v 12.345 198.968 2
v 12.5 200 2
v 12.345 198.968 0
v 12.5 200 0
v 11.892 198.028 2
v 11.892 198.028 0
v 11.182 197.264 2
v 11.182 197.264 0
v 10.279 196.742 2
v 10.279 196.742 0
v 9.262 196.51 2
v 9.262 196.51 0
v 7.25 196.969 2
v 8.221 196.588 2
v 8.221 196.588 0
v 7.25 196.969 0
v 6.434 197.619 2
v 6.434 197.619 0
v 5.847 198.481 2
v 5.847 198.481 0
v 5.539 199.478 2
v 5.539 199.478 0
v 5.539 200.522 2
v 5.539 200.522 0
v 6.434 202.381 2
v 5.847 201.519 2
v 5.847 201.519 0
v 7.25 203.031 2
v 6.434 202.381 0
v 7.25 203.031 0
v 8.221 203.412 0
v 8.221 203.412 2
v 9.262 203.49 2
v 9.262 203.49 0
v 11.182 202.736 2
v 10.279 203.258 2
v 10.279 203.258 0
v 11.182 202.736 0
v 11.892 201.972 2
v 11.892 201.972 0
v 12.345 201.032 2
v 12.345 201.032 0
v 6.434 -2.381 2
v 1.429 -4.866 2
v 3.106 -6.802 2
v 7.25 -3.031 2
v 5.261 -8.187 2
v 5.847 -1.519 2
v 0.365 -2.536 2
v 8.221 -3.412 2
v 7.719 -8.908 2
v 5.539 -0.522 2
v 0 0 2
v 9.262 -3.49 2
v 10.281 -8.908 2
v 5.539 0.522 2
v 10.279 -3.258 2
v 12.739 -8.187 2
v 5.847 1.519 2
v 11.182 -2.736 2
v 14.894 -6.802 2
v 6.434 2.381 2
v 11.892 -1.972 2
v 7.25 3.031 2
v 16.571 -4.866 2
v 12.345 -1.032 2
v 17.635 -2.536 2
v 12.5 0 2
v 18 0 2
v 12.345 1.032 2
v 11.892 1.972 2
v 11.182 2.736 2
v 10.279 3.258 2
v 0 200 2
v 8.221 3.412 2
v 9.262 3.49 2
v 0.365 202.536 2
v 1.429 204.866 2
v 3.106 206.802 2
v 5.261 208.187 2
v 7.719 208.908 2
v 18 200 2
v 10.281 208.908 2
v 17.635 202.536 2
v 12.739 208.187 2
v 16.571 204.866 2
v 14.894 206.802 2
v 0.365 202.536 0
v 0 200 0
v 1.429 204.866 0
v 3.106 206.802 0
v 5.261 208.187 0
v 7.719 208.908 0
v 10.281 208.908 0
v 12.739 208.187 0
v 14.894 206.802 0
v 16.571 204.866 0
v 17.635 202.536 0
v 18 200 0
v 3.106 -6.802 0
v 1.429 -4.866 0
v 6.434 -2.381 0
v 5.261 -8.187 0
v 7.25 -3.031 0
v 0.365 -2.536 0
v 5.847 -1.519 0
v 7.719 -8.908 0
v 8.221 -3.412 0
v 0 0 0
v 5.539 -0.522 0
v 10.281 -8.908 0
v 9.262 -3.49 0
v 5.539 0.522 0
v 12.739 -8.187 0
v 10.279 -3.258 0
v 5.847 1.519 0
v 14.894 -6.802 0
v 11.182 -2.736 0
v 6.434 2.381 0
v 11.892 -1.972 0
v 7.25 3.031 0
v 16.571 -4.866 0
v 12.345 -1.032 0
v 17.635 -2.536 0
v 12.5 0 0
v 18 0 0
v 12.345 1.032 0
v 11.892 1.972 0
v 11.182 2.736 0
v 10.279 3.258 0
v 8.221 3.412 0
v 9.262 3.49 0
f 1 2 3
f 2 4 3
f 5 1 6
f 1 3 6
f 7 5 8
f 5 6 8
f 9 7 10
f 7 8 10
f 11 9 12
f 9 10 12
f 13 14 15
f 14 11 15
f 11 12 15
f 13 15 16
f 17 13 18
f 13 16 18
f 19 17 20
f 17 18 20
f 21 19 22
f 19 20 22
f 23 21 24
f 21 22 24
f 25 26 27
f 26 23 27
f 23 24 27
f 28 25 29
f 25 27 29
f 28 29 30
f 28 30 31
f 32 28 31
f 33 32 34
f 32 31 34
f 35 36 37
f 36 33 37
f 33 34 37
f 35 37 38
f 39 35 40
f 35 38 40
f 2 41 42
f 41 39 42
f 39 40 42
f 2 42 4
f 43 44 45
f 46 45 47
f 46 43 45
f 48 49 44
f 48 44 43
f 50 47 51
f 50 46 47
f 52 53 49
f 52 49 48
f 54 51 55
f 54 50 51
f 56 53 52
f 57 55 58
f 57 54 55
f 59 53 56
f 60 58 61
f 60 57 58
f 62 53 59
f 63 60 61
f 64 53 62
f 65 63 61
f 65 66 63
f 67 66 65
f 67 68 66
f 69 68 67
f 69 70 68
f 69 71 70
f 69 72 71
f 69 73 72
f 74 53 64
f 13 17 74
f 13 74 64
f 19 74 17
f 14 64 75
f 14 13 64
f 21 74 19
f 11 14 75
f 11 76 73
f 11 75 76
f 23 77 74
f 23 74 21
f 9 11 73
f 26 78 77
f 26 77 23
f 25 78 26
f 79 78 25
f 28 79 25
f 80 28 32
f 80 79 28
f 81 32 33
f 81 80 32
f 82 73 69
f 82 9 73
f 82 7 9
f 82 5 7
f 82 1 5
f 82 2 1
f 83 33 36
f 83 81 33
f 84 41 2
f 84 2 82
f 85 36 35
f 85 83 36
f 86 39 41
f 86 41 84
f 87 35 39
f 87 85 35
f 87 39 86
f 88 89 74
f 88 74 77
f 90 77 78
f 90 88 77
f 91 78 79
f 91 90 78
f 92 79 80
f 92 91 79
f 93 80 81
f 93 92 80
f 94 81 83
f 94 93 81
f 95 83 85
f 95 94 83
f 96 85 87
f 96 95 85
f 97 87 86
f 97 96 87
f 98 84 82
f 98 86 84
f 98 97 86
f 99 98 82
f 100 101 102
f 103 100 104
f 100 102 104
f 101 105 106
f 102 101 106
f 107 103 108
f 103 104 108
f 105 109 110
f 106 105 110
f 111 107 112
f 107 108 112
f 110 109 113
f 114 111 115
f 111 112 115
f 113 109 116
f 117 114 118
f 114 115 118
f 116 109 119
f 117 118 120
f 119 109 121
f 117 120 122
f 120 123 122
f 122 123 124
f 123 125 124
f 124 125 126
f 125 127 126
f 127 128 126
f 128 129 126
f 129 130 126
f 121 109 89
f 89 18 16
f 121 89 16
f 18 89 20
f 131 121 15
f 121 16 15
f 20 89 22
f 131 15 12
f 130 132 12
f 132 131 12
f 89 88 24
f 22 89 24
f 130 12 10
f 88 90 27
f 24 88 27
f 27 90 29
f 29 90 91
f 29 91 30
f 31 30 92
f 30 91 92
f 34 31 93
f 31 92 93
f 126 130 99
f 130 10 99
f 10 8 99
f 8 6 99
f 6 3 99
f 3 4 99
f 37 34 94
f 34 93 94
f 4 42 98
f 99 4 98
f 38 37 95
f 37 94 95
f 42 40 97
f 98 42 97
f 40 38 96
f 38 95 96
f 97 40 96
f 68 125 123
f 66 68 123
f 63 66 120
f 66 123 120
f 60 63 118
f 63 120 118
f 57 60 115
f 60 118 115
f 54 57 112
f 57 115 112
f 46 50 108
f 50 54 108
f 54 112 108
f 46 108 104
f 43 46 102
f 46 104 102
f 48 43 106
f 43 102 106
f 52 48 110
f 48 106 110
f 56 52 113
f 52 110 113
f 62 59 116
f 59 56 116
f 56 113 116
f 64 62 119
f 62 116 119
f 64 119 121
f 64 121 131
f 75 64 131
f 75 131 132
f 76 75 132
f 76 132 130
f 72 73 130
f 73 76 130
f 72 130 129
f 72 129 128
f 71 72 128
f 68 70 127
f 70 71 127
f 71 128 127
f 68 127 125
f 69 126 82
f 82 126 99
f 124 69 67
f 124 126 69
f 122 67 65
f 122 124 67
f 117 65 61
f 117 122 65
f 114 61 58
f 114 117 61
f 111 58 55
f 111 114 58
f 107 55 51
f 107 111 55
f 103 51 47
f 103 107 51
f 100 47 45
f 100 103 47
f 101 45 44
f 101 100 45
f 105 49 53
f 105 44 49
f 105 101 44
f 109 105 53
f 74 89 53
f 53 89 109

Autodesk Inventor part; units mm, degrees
ref_plane "YZ Plane" through (0, 0, 0) normal (1, 0, 0) x (0, 1, 0)
ref_plane "XZ Plane" through (0, 0, 0) normal (0, 1, 0) x (-1, 0, 0)
ref_plane "XY Plane" through (0, 0, 0) normal (0, 0, 1) x (1, 0, 0)
sketch "スケッチ1" plane through (0, 0, 0) normal (0, 0, 1) x (1, 0, 0)
  line L0 (18, 0) -> (18, 200)
  line L1 (0, 200) -> (0, 0)
  line L2 (9, 200) -> (9, 0) construction
  arc A0 (18, 200) -> (0, 200) centre (9, 200) ccw
  arc A1 (0, 0) -> (18, 0) centre (9, 0) ccw
  circle A2 centre (9, 0) radius 3.5
  circle A3 centre (9, 200) radius 3.5
  dimension "d35" = 18
  dimension "d36" = 200
  dimension "d37" = 7
  dimension "d38" = 7
extrude "押し出し1" add sketch "スケッチ1" along normal blind 2
properties part number "foot_link" material "GFRP"
